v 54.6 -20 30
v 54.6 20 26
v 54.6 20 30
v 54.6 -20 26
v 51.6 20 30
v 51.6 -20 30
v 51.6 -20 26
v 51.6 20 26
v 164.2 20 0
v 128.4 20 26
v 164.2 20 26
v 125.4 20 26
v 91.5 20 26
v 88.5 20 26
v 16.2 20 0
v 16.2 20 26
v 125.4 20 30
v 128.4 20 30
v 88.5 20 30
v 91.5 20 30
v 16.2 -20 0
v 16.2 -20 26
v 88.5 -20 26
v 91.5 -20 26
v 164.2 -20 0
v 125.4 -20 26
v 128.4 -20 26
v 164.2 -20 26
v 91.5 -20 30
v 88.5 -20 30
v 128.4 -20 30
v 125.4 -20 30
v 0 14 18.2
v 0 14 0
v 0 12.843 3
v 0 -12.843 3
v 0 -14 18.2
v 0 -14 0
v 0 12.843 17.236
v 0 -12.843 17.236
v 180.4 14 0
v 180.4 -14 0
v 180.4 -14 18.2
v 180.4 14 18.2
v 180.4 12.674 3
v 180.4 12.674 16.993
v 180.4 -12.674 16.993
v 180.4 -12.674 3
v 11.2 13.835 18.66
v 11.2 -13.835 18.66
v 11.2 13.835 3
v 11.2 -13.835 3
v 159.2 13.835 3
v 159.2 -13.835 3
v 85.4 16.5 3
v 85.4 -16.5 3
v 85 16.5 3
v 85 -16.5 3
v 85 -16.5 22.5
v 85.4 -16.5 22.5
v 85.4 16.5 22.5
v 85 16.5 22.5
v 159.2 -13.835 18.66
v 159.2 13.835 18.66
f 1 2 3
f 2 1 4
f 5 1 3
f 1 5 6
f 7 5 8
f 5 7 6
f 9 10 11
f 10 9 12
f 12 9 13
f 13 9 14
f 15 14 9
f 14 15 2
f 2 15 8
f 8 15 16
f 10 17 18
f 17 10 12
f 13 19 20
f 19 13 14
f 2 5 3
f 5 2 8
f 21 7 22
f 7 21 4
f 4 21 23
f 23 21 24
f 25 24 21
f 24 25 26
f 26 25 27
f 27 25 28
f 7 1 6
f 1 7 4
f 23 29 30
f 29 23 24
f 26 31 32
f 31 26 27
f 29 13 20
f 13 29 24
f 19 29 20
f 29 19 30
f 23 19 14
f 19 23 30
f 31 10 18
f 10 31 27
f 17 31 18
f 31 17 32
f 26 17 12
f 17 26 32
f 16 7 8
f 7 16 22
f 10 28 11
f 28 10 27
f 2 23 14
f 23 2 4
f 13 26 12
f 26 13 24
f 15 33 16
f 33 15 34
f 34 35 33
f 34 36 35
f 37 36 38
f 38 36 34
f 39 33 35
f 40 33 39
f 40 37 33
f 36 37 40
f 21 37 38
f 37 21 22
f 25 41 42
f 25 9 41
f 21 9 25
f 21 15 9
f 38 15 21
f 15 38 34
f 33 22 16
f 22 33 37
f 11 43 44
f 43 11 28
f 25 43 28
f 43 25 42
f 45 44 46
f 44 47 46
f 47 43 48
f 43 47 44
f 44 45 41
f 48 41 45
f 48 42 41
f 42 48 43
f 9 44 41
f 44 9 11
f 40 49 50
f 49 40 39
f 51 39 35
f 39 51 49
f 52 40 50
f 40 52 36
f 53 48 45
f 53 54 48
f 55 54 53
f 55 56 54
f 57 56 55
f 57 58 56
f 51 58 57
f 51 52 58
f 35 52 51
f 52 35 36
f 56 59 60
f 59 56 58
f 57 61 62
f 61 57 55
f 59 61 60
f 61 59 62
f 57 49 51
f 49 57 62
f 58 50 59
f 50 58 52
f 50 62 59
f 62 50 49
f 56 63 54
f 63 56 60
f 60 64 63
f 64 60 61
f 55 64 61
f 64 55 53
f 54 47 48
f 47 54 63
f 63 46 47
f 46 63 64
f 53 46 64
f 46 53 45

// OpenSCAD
$fn = 32;

// ----------------------------------------------------------------------
// Faired channel: 180 x 40 x 26 mm, 3.5 mm walls, faired ends
// ----------------------------------------------------------------------

// --- parameters (mm) ---
length = 180;             // channel length
width = 40;               // channel width at mid length
height = 26;              // channel height at mid length
wall = 3.5;               // side wall thickness
floor_t = 3;              // floor thickness
end_w = 28;               // faired end width
end_h = 18.2;             // faired end height
ribs = 3;                 // stiffening ribs on the top
rib_t = 3;                // rib thickness
rib_h = 4;                // rib height

difference() {
  union() {
    hull() {
      translate([0, -14, 0]) cube([0.4, 28, 18.2]);
      translate([16.2, -20, 0]) cube([0.4, 40, 26]);
    }
    hull() {
      translate([16.2, -20, 0]) cube([0.4, 40, 26]);
      translate([90, -20, 0]) cube([0.4, 40, 26]);
    }
    hull() {
      translate([90, -20, 0]) cube([0.4, 40, 26]);
      translate([163.8, -20, 0]) cube([0.4, 40, 26]);
    }
    hull() {
      translate([163.8, -20, 0]) cube([0.4, 40, 26]);
      translate([180, -14, 0]) cube([0.4, 28, 18.2]);
    }
    /* stiffening ribs across the flat top, sunk 0.8 mm into it */
    for (i = [1 : ribs]) {
      translate([16.2 + i * (length - 2 * 16.2) / (ribs + 1) - rib_t / 2, -width / 2, height - 0.8]) cube([rib_t, width, rib_h + 0.8]);
    }
  }
  /* cavity, 5 mm proud of both ends so the ports are cut clean */
  hull() {
    translate([-5, -12.4, 3]) cube([0.4, 24.8, 13.6]);
    translate([11.2, -13.835, 3]) cube([0.4, 27.67, 15.66]);
  }
  hull() {
    translate([11.2, -13.835, 3]) cube([0.4, 27.67, 15.66]);
    translate([85, -16.5, 3]) cube([0.4, 33, 19.5]);
  }
  hull() {
    translate([85, -16.5, 3]) cube([0.4, 33, 19.5]);
    translate([158.8, -13.835, 3]) cube([0.4, 27.67, 15.66]);
  }
  hull() {
    translate([158.8, -13.835, 3]) cube([0.4, 27.67, 15.66]);
    translate([185, -12.4, 3]) cube([0.4, 24.8, 13.6]);
  }
}
